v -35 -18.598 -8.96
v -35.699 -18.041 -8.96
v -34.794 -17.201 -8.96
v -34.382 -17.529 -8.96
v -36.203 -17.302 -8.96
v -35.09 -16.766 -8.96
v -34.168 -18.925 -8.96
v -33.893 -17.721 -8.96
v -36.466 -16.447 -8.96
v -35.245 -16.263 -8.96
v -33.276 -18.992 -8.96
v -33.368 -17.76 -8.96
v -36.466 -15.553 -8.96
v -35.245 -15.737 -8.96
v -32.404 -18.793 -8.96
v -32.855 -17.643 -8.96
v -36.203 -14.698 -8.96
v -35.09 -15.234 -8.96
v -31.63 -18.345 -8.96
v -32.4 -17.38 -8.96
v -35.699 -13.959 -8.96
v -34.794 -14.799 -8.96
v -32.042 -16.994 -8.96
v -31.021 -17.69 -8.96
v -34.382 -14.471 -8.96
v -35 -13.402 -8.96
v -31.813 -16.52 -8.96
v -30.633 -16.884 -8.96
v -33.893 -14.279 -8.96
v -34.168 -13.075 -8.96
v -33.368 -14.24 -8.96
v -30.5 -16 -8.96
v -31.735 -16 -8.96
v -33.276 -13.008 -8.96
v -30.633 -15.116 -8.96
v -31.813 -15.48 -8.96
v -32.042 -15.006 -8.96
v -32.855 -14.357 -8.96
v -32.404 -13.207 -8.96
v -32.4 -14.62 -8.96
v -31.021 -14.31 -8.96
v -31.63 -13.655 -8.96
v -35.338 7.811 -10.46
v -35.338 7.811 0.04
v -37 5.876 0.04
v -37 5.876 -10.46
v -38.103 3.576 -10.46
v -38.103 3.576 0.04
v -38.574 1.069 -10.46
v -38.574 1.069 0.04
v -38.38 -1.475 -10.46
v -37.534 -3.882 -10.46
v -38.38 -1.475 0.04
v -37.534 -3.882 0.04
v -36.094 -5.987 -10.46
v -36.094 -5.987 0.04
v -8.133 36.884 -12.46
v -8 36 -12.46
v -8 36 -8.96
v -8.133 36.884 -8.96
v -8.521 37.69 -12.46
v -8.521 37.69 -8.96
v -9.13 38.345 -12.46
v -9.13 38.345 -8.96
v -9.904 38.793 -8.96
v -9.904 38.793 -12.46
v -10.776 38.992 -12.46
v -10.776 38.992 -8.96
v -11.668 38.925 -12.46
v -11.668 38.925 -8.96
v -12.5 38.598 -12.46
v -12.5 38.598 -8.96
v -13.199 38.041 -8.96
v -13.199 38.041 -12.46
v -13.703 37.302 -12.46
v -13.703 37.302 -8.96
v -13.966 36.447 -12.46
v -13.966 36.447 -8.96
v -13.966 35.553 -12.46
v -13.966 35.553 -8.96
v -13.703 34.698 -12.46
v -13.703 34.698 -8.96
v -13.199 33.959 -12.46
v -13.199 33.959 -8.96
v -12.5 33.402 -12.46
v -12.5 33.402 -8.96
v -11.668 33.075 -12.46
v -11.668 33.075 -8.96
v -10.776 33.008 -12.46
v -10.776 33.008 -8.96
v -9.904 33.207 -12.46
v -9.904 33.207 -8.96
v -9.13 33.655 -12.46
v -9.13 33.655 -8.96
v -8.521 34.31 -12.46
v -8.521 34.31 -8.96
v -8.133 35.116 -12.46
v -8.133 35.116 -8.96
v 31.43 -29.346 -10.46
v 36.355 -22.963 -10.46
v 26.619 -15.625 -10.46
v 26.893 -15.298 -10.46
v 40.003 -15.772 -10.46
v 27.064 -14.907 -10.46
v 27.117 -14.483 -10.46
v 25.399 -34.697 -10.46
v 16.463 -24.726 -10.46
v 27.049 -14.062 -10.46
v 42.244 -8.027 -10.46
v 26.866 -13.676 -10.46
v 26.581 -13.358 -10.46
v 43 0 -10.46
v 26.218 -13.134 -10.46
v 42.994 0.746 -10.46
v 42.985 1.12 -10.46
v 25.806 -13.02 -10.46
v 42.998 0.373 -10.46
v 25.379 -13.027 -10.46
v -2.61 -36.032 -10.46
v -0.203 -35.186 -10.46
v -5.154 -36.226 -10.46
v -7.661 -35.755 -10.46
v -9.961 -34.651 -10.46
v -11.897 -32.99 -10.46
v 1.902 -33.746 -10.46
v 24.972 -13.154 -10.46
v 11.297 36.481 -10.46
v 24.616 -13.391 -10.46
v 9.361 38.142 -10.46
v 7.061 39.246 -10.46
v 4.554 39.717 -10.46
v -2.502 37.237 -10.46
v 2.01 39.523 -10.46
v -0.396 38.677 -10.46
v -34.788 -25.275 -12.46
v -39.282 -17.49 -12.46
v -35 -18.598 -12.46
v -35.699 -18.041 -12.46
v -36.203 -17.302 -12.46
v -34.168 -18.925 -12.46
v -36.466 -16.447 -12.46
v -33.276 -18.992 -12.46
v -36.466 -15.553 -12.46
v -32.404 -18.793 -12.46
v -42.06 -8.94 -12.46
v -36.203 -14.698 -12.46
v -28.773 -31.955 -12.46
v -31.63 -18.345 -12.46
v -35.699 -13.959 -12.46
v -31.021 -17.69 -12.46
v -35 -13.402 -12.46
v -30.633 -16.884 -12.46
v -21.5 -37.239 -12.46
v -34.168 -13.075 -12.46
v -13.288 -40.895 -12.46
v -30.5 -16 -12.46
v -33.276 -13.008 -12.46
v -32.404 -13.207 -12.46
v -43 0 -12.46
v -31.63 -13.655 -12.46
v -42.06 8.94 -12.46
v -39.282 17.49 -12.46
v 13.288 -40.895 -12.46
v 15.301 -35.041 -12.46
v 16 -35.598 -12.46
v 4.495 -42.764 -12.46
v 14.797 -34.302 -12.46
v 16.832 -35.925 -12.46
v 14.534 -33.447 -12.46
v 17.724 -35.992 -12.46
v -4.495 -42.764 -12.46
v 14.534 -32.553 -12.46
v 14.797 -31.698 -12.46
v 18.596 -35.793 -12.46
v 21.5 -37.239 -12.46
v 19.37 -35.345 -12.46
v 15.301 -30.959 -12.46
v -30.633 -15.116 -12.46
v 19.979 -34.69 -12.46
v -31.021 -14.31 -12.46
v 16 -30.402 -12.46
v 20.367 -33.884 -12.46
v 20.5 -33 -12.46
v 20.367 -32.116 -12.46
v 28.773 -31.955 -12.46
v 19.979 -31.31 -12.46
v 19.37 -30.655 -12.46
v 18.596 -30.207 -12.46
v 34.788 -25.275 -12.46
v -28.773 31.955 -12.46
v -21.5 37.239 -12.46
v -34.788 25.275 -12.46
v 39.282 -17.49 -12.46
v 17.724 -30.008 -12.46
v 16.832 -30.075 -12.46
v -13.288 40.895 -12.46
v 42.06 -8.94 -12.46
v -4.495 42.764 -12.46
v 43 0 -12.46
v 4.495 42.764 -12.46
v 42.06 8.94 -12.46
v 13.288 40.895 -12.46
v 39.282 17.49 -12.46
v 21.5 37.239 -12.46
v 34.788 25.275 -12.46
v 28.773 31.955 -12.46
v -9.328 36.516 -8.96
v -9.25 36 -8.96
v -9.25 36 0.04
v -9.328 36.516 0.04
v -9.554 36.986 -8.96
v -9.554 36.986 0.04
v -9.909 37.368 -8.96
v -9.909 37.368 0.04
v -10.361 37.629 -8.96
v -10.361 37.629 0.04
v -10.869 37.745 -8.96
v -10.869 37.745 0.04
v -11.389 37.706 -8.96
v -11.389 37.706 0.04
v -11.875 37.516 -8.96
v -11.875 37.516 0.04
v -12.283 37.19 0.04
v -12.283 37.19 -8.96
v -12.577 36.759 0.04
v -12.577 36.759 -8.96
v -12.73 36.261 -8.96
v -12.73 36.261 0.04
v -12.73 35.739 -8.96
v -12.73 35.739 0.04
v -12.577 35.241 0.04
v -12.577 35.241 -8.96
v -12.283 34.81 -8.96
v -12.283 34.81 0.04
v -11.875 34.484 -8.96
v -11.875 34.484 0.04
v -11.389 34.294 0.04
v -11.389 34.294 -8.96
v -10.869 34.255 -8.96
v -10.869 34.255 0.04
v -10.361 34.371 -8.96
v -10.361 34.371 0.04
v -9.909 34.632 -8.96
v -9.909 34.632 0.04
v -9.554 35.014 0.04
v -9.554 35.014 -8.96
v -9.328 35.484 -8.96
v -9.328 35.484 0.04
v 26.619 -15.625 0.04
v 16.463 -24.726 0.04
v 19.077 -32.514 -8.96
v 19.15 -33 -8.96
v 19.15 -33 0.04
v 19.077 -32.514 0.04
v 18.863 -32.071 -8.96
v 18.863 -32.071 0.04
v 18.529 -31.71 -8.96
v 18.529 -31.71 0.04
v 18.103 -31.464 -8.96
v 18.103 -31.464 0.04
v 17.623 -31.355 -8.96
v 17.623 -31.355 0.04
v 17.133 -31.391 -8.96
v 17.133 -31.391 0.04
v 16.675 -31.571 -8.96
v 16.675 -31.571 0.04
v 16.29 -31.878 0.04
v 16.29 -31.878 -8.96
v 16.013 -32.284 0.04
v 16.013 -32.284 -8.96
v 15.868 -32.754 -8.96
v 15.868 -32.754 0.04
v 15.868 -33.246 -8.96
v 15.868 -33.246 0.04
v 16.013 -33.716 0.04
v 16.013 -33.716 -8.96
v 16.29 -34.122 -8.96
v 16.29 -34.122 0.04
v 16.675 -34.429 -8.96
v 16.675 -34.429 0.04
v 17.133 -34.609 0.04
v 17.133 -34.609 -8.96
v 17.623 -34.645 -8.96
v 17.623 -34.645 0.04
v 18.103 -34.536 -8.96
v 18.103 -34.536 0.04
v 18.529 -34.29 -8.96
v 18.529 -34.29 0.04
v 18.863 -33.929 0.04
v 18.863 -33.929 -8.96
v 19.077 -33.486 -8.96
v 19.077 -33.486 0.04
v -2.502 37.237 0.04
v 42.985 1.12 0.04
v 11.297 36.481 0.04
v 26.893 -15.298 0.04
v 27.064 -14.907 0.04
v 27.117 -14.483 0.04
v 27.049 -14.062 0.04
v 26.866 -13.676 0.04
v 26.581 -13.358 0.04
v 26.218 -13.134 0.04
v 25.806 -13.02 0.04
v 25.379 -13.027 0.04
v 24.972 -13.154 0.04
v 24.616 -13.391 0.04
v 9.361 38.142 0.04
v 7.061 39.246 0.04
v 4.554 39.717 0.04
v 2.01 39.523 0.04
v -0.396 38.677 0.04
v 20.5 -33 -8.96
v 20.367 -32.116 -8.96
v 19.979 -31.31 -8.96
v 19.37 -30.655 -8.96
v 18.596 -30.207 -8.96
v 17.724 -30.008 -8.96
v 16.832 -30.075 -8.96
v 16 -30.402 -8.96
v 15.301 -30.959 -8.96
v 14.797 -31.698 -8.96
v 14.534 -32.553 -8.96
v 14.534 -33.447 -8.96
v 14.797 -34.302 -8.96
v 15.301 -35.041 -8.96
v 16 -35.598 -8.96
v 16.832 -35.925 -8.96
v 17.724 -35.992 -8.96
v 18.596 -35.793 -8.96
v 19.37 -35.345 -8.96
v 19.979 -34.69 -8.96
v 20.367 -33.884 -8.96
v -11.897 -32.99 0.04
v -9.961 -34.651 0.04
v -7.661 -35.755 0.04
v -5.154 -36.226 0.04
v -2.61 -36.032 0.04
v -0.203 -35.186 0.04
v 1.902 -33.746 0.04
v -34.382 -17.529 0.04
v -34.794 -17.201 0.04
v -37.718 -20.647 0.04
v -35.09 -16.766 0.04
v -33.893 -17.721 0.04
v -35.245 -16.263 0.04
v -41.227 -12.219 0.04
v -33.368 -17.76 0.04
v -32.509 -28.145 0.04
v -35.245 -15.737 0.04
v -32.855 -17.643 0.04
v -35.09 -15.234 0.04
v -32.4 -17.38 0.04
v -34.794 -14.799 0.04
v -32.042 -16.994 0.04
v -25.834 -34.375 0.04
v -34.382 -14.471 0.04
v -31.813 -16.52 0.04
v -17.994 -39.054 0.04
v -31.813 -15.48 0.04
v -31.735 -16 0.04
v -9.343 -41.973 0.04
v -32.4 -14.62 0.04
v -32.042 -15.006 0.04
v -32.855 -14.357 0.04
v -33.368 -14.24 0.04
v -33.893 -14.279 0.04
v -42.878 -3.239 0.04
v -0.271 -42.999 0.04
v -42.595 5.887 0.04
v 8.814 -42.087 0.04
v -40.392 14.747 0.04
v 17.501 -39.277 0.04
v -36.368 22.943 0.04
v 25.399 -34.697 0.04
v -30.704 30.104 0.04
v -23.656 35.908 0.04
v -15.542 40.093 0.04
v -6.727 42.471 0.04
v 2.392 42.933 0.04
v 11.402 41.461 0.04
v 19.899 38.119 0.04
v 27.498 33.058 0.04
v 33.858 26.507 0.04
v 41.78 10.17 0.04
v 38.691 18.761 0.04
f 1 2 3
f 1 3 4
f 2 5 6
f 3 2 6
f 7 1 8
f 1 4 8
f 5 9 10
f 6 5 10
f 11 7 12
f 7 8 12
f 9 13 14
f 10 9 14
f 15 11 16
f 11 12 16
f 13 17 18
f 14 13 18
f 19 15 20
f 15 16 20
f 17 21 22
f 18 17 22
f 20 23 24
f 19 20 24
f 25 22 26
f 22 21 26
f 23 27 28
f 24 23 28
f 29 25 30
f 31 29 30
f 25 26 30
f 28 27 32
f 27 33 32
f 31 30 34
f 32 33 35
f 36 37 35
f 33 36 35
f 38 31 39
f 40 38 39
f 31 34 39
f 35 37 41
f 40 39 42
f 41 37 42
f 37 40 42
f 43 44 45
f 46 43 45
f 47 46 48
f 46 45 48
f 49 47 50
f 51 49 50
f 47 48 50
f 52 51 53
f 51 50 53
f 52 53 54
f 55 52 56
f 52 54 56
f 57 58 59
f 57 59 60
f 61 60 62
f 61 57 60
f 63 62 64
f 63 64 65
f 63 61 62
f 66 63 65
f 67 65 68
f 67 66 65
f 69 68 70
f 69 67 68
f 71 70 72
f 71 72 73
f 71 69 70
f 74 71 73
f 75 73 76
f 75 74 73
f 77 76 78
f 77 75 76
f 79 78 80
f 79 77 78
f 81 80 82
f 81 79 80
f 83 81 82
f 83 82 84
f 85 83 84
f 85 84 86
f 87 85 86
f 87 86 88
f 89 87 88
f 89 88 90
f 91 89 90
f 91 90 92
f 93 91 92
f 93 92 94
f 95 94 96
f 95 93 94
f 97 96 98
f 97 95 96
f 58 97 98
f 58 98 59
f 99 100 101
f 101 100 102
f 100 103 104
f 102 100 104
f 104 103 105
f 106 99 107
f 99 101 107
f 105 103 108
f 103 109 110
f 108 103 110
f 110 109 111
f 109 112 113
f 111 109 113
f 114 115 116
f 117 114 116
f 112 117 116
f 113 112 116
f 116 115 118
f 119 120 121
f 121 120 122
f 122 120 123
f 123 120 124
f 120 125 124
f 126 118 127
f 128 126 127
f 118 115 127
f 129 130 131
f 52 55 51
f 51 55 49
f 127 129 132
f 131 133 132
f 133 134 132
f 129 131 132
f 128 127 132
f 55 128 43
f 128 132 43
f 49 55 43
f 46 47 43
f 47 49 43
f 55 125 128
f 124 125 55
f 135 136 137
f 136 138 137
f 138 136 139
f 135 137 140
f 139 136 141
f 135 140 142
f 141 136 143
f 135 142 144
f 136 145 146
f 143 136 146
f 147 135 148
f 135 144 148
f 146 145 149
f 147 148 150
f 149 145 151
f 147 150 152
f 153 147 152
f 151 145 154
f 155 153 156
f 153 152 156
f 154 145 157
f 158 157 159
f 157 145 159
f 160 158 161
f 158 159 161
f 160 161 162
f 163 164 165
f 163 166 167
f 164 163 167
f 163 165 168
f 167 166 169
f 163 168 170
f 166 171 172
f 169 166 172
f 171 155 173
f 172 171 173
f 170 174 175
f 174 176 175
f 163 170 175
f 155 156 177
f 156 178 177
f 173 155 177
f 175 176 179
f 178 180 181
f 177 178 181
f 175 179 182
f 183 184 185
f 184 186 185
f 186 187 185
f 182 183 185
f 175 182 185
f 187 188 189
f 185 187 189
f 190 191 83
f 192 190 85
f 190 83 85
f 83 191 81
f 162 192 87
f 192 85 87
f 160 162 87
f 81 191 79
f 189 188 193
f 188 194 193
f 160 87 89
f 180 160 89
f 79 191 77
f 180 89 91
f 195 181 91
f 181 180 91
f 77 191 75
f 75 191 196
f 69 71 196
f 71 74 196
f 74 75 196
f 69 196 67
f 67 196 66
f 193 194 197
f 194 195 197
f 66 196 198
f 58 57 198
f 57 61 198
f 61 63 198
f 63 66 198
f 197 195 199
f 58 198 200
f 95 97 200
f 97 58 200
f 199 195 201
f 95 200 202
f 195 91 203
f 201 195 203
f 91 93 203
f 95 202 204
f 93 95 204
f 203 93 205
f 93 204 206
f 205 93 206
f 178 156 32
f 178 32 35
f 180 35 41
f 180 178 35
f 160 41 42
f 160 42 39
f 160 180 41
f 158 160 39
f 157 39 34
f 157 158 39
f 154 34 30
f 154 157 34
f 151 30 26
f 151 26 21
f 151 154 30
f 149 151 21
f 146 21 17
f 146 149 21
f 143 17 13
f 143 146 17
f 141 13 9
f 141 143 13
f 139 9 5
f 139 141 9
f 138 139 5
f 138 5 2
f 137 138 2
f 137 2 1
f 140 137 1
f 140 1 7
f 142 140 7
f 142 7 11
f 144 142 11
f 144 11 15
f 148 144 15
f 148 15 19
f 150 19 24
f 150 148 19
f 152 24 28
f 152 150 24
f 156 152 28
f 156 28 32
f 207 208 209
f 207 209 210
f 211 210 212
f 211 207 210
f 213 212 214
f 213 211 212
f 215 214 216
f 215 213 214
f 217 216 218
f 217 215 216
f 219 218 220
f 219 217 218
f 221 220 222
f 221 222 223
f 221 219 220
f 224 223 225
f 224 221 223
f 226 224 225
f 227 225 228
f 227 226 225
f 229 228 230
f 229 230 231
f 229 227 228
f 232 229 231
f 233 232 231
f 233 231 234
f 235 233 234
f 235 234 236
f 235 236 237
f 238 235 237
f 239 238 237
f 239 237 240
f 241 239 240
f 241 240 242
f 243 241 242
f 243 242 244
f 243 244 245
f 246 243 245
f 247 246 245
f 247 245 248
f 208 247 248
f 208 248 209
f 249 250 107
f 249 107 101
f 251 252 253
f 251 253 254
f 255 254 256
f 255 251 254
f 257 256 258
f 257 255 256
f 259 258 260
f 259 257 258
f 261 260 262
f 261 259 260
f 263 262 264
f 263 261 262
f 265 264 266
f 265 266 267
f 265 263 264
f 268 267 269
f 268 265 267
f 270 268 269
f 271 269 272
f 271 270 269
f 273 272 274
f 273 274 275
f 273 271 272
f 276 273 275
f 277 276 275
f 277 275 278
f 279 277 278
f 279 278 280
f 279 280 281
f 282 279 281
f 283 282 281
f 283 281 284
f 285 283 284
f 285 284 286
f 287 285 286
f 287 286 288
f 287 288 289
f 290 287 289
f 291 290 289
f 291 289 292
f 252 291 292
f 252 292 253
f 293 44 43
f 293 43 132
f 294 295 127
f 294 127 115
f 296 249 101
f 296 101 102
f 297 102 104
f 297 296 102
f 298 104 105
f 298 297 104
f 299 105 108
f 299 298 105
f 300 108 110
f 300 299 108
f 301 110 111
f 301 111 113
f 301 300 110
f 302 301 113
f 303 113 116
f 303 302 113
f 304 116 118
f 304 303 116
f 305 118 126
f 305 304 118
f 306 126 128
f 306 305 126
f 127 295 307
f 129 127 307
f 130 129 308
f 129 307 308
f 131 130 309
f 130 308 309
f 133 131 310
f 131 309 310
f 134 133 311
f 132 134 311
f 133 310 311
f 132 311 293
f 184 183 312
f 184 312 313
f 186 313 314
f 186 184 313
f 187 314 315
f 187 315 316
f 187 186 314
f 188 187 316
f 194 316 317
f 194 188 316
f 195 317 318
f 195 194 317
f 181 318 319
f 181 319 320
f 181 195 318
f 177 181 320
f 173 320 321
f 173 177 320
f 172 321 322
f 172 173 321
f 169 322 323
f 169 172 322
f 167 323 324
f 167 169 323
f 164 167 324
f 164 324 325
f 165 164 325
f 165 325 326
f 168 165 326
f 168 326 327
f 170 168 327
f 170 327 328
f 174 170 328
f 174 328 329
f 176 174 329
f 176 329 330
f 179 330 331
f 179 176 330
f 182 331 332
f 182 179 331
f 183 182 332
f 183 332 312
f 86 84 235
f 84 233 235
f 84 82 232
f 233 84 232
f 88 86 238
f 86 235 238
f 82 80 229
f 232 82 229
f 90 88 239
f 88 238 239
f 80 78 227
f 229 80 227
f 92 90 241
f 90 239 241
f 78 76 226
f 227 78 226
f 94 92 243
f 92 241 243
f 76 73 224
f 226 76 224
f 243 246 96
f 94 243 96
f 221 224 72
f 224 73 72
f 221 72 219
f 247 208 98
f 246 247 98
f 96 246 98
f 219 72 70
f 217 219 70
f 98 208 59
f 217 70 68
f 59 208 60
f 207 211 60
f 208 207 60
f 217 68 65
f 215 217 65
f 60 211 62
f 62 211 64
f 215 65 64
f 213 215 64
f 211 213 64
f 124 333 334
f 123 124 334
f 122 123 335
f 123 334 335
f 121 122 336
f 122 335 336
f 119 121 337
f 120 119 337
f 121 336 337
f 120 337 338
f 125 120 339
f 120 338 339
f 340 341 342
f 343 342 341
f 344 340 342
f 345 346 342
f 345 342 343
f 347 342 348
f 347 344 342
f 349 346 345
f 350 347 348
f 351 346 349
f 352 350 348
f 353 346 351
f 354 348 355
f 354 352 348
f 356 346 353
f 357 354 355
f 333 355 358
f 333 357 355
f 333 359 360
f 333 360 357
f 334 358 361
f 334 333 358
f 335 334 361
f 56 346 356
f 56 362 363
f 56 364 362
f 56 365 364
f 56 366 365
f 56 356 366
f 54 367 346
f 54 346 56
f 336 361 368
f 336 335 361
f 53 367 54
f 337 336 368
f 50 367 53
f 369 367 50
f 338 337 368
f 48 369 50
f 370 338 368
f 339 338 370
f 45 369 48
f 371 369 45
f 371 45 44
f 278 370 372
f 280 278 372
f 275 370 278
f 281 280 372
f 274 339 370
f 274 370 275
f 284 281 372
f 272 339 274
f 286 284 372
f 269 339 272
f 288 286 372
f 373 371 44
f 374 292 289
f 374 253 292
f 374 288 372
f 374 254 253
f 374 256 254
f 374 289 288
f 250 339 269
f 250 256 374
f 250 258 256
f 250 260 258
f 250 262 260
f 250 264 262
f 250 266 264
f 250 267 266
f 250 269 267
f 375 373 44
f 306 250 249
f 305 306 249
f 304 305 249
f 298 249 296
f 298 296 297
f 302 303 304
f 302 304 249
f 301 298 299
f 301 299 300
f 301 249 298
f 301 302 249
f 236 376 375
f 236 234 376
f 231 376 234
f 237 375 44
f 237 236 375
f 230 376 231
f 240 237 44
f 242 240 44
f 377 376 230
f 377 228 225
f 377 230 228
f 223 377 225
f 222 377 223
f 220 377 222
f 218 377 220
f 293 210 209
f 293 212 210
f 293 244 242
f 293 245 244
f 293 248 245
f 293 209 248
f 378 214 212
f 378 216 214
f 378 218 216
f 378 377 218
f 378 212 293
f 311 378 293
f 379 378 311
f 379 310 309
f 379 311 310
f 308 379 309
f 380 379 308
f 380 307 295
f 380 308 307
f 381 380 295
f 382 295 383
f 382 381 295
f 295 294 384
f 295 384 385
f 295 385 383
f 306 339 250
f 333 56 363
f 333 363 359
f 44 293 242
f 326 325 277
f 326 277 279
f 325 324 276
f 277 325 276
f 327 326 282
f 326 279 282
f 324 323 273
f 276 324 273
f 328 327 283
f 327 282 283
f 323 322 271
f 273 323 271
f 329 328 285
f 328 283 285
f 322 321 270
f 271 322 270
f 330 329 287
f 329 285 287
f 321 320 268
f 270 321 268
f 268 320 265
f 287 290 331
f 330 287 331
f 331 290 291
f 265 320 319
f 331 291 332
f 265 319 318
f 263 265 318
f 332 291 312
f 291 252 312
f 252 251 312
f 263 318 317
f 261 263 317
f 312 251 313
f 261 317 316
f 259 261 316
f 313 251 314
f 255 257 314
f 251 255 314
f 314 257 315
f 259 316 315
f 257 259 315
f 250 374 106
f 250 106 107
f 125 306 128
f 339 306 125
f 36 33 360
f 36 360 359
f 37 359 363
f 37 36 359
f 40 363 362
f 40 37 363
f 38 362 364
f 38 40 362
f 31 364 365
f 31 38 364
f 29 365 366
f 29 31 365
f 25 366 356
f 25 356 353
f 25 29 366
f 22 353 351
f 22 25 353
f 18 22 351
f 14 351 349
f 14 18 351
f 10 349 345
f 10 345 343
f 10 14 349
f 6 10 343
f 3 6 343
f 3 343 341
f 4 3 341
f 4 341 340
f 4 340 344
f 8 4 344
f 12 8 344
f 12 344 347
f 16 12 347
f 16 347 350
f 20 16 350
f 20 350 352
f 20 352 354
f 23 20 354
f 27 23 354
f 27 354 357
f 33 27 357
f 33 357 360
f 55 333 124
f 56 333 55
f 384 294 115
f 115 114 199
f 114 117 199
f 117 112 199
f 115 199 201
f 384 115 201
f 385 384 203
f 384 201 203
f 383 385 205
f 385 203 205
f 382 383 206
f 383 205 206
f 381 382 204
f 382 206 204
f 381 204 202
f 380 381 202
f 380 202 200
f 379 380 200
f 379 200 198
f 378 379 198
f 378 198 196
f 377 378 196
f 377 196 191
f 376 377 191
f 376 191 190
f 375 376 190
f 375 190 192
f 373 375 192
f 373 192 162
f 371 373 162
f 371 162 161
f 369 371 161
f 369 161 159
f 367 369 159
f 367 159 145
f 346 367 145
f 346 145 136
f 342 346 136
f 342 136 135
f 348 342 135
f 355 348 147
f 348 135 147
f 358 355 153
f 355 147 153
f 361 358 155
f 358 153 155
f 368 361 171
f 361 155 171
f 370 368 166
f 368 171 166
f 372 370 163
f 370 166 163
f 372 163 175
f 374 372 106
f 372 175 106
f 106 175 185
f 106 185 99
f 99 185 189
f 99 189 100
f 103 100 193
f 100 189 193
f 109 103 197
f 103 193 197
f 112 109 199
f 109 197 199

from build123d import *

# Parameters (mm, degrees)
SKETCH030_R     = 43
SKETCH030_R_2   = 1.765
SKETCH030_R_3   = 1.65
SKETCH030_R_4   = 1.75
PAD005_DEPTH    = 12.5
POCKET001_DEPTH = 10.5
SKETCH032_R     = 3
POCKET002_DEPTH = 3.5


with BuildPart() as part:
    # Sketch030 → Pad005 (new body)
    with BuildSketch(Plane.XY):
        Circle(SKETCH030_R)
        with Locations((-33.5, -16)):
            Circle(SKETCH030_R_2, mode=Mode.SUBTRACT)
        with Locations((17.5, -33)):
            Circle(SKETCH030_R_3, mode=Mode.SUBTRACT)
        with Locations((-11, 36)):
            Circle(SKETCH030_R_4, mode=Mode.SUBTRACT)
    extrude(amount=PAD005_DEPTH)

    # Sketch031 (on Face6 of Pad005) → Pocket001 (cut)
    with BuildSketch(Plane.XY.offset(12.5)):
        with BuildLine():
            Line((11.296867, 36.481132), (53.761138, -10.905243))
            Line((53.761138, -10.905243), (26.20627, -35.59794))
            Line((26.20627, -35.59794), (16.463311, -24.725657))
            Line((16.463311, -24.725657), (26.618554, -15.625256))
            ThreePointArc((26.618554, -15.625256), (26.734588, -13.507112), (24.616444, -13.391078))
            Line((24.616444, -13.391078), (1.902296, -33.745868))
            ThreePointArc((-11.896643, -32.989949), (-5.153729, -36.225762), (1.902296, -33.745868))
            Line((-11.896643, -32.989949), (-36.094334, -5.987464))
            ThreePointArc((-35.338415, 7.811475), (-38.574228, 1.068561), (-36.094334, -5.987464))
            Line((-35.338415, 7.811475), (-2.502071, 37.237051))
            ThreePointArc((11.296867, 36.481132), (4.553954, 39.716945), (-2.502071, 37.237051))
        make_face()
    extrude(amount=-POCKET001_DEPTH, mode=Mode.SUBTRACT)

    # Sketch032 → Pocket002 (cut)
    with BuildSketch(Plane.XY):
        with Locations((-33.5, -16)):
            Circle(SKETCH032_R)
        with Locations((17.5, -33)):
            Circle(SKETCH032_R)
        with Locations((-11, 36)):
            Circle(SKETCH032_R)
    extrude(amount=POCKET002_DEPTH, mode=Mode.SUBTRACT)


with BuildPart() as part_1:
    # Body007 placement: moved
    add(part.part.moved(Location((0, 0, -12.46))))


solid = part_1.part
